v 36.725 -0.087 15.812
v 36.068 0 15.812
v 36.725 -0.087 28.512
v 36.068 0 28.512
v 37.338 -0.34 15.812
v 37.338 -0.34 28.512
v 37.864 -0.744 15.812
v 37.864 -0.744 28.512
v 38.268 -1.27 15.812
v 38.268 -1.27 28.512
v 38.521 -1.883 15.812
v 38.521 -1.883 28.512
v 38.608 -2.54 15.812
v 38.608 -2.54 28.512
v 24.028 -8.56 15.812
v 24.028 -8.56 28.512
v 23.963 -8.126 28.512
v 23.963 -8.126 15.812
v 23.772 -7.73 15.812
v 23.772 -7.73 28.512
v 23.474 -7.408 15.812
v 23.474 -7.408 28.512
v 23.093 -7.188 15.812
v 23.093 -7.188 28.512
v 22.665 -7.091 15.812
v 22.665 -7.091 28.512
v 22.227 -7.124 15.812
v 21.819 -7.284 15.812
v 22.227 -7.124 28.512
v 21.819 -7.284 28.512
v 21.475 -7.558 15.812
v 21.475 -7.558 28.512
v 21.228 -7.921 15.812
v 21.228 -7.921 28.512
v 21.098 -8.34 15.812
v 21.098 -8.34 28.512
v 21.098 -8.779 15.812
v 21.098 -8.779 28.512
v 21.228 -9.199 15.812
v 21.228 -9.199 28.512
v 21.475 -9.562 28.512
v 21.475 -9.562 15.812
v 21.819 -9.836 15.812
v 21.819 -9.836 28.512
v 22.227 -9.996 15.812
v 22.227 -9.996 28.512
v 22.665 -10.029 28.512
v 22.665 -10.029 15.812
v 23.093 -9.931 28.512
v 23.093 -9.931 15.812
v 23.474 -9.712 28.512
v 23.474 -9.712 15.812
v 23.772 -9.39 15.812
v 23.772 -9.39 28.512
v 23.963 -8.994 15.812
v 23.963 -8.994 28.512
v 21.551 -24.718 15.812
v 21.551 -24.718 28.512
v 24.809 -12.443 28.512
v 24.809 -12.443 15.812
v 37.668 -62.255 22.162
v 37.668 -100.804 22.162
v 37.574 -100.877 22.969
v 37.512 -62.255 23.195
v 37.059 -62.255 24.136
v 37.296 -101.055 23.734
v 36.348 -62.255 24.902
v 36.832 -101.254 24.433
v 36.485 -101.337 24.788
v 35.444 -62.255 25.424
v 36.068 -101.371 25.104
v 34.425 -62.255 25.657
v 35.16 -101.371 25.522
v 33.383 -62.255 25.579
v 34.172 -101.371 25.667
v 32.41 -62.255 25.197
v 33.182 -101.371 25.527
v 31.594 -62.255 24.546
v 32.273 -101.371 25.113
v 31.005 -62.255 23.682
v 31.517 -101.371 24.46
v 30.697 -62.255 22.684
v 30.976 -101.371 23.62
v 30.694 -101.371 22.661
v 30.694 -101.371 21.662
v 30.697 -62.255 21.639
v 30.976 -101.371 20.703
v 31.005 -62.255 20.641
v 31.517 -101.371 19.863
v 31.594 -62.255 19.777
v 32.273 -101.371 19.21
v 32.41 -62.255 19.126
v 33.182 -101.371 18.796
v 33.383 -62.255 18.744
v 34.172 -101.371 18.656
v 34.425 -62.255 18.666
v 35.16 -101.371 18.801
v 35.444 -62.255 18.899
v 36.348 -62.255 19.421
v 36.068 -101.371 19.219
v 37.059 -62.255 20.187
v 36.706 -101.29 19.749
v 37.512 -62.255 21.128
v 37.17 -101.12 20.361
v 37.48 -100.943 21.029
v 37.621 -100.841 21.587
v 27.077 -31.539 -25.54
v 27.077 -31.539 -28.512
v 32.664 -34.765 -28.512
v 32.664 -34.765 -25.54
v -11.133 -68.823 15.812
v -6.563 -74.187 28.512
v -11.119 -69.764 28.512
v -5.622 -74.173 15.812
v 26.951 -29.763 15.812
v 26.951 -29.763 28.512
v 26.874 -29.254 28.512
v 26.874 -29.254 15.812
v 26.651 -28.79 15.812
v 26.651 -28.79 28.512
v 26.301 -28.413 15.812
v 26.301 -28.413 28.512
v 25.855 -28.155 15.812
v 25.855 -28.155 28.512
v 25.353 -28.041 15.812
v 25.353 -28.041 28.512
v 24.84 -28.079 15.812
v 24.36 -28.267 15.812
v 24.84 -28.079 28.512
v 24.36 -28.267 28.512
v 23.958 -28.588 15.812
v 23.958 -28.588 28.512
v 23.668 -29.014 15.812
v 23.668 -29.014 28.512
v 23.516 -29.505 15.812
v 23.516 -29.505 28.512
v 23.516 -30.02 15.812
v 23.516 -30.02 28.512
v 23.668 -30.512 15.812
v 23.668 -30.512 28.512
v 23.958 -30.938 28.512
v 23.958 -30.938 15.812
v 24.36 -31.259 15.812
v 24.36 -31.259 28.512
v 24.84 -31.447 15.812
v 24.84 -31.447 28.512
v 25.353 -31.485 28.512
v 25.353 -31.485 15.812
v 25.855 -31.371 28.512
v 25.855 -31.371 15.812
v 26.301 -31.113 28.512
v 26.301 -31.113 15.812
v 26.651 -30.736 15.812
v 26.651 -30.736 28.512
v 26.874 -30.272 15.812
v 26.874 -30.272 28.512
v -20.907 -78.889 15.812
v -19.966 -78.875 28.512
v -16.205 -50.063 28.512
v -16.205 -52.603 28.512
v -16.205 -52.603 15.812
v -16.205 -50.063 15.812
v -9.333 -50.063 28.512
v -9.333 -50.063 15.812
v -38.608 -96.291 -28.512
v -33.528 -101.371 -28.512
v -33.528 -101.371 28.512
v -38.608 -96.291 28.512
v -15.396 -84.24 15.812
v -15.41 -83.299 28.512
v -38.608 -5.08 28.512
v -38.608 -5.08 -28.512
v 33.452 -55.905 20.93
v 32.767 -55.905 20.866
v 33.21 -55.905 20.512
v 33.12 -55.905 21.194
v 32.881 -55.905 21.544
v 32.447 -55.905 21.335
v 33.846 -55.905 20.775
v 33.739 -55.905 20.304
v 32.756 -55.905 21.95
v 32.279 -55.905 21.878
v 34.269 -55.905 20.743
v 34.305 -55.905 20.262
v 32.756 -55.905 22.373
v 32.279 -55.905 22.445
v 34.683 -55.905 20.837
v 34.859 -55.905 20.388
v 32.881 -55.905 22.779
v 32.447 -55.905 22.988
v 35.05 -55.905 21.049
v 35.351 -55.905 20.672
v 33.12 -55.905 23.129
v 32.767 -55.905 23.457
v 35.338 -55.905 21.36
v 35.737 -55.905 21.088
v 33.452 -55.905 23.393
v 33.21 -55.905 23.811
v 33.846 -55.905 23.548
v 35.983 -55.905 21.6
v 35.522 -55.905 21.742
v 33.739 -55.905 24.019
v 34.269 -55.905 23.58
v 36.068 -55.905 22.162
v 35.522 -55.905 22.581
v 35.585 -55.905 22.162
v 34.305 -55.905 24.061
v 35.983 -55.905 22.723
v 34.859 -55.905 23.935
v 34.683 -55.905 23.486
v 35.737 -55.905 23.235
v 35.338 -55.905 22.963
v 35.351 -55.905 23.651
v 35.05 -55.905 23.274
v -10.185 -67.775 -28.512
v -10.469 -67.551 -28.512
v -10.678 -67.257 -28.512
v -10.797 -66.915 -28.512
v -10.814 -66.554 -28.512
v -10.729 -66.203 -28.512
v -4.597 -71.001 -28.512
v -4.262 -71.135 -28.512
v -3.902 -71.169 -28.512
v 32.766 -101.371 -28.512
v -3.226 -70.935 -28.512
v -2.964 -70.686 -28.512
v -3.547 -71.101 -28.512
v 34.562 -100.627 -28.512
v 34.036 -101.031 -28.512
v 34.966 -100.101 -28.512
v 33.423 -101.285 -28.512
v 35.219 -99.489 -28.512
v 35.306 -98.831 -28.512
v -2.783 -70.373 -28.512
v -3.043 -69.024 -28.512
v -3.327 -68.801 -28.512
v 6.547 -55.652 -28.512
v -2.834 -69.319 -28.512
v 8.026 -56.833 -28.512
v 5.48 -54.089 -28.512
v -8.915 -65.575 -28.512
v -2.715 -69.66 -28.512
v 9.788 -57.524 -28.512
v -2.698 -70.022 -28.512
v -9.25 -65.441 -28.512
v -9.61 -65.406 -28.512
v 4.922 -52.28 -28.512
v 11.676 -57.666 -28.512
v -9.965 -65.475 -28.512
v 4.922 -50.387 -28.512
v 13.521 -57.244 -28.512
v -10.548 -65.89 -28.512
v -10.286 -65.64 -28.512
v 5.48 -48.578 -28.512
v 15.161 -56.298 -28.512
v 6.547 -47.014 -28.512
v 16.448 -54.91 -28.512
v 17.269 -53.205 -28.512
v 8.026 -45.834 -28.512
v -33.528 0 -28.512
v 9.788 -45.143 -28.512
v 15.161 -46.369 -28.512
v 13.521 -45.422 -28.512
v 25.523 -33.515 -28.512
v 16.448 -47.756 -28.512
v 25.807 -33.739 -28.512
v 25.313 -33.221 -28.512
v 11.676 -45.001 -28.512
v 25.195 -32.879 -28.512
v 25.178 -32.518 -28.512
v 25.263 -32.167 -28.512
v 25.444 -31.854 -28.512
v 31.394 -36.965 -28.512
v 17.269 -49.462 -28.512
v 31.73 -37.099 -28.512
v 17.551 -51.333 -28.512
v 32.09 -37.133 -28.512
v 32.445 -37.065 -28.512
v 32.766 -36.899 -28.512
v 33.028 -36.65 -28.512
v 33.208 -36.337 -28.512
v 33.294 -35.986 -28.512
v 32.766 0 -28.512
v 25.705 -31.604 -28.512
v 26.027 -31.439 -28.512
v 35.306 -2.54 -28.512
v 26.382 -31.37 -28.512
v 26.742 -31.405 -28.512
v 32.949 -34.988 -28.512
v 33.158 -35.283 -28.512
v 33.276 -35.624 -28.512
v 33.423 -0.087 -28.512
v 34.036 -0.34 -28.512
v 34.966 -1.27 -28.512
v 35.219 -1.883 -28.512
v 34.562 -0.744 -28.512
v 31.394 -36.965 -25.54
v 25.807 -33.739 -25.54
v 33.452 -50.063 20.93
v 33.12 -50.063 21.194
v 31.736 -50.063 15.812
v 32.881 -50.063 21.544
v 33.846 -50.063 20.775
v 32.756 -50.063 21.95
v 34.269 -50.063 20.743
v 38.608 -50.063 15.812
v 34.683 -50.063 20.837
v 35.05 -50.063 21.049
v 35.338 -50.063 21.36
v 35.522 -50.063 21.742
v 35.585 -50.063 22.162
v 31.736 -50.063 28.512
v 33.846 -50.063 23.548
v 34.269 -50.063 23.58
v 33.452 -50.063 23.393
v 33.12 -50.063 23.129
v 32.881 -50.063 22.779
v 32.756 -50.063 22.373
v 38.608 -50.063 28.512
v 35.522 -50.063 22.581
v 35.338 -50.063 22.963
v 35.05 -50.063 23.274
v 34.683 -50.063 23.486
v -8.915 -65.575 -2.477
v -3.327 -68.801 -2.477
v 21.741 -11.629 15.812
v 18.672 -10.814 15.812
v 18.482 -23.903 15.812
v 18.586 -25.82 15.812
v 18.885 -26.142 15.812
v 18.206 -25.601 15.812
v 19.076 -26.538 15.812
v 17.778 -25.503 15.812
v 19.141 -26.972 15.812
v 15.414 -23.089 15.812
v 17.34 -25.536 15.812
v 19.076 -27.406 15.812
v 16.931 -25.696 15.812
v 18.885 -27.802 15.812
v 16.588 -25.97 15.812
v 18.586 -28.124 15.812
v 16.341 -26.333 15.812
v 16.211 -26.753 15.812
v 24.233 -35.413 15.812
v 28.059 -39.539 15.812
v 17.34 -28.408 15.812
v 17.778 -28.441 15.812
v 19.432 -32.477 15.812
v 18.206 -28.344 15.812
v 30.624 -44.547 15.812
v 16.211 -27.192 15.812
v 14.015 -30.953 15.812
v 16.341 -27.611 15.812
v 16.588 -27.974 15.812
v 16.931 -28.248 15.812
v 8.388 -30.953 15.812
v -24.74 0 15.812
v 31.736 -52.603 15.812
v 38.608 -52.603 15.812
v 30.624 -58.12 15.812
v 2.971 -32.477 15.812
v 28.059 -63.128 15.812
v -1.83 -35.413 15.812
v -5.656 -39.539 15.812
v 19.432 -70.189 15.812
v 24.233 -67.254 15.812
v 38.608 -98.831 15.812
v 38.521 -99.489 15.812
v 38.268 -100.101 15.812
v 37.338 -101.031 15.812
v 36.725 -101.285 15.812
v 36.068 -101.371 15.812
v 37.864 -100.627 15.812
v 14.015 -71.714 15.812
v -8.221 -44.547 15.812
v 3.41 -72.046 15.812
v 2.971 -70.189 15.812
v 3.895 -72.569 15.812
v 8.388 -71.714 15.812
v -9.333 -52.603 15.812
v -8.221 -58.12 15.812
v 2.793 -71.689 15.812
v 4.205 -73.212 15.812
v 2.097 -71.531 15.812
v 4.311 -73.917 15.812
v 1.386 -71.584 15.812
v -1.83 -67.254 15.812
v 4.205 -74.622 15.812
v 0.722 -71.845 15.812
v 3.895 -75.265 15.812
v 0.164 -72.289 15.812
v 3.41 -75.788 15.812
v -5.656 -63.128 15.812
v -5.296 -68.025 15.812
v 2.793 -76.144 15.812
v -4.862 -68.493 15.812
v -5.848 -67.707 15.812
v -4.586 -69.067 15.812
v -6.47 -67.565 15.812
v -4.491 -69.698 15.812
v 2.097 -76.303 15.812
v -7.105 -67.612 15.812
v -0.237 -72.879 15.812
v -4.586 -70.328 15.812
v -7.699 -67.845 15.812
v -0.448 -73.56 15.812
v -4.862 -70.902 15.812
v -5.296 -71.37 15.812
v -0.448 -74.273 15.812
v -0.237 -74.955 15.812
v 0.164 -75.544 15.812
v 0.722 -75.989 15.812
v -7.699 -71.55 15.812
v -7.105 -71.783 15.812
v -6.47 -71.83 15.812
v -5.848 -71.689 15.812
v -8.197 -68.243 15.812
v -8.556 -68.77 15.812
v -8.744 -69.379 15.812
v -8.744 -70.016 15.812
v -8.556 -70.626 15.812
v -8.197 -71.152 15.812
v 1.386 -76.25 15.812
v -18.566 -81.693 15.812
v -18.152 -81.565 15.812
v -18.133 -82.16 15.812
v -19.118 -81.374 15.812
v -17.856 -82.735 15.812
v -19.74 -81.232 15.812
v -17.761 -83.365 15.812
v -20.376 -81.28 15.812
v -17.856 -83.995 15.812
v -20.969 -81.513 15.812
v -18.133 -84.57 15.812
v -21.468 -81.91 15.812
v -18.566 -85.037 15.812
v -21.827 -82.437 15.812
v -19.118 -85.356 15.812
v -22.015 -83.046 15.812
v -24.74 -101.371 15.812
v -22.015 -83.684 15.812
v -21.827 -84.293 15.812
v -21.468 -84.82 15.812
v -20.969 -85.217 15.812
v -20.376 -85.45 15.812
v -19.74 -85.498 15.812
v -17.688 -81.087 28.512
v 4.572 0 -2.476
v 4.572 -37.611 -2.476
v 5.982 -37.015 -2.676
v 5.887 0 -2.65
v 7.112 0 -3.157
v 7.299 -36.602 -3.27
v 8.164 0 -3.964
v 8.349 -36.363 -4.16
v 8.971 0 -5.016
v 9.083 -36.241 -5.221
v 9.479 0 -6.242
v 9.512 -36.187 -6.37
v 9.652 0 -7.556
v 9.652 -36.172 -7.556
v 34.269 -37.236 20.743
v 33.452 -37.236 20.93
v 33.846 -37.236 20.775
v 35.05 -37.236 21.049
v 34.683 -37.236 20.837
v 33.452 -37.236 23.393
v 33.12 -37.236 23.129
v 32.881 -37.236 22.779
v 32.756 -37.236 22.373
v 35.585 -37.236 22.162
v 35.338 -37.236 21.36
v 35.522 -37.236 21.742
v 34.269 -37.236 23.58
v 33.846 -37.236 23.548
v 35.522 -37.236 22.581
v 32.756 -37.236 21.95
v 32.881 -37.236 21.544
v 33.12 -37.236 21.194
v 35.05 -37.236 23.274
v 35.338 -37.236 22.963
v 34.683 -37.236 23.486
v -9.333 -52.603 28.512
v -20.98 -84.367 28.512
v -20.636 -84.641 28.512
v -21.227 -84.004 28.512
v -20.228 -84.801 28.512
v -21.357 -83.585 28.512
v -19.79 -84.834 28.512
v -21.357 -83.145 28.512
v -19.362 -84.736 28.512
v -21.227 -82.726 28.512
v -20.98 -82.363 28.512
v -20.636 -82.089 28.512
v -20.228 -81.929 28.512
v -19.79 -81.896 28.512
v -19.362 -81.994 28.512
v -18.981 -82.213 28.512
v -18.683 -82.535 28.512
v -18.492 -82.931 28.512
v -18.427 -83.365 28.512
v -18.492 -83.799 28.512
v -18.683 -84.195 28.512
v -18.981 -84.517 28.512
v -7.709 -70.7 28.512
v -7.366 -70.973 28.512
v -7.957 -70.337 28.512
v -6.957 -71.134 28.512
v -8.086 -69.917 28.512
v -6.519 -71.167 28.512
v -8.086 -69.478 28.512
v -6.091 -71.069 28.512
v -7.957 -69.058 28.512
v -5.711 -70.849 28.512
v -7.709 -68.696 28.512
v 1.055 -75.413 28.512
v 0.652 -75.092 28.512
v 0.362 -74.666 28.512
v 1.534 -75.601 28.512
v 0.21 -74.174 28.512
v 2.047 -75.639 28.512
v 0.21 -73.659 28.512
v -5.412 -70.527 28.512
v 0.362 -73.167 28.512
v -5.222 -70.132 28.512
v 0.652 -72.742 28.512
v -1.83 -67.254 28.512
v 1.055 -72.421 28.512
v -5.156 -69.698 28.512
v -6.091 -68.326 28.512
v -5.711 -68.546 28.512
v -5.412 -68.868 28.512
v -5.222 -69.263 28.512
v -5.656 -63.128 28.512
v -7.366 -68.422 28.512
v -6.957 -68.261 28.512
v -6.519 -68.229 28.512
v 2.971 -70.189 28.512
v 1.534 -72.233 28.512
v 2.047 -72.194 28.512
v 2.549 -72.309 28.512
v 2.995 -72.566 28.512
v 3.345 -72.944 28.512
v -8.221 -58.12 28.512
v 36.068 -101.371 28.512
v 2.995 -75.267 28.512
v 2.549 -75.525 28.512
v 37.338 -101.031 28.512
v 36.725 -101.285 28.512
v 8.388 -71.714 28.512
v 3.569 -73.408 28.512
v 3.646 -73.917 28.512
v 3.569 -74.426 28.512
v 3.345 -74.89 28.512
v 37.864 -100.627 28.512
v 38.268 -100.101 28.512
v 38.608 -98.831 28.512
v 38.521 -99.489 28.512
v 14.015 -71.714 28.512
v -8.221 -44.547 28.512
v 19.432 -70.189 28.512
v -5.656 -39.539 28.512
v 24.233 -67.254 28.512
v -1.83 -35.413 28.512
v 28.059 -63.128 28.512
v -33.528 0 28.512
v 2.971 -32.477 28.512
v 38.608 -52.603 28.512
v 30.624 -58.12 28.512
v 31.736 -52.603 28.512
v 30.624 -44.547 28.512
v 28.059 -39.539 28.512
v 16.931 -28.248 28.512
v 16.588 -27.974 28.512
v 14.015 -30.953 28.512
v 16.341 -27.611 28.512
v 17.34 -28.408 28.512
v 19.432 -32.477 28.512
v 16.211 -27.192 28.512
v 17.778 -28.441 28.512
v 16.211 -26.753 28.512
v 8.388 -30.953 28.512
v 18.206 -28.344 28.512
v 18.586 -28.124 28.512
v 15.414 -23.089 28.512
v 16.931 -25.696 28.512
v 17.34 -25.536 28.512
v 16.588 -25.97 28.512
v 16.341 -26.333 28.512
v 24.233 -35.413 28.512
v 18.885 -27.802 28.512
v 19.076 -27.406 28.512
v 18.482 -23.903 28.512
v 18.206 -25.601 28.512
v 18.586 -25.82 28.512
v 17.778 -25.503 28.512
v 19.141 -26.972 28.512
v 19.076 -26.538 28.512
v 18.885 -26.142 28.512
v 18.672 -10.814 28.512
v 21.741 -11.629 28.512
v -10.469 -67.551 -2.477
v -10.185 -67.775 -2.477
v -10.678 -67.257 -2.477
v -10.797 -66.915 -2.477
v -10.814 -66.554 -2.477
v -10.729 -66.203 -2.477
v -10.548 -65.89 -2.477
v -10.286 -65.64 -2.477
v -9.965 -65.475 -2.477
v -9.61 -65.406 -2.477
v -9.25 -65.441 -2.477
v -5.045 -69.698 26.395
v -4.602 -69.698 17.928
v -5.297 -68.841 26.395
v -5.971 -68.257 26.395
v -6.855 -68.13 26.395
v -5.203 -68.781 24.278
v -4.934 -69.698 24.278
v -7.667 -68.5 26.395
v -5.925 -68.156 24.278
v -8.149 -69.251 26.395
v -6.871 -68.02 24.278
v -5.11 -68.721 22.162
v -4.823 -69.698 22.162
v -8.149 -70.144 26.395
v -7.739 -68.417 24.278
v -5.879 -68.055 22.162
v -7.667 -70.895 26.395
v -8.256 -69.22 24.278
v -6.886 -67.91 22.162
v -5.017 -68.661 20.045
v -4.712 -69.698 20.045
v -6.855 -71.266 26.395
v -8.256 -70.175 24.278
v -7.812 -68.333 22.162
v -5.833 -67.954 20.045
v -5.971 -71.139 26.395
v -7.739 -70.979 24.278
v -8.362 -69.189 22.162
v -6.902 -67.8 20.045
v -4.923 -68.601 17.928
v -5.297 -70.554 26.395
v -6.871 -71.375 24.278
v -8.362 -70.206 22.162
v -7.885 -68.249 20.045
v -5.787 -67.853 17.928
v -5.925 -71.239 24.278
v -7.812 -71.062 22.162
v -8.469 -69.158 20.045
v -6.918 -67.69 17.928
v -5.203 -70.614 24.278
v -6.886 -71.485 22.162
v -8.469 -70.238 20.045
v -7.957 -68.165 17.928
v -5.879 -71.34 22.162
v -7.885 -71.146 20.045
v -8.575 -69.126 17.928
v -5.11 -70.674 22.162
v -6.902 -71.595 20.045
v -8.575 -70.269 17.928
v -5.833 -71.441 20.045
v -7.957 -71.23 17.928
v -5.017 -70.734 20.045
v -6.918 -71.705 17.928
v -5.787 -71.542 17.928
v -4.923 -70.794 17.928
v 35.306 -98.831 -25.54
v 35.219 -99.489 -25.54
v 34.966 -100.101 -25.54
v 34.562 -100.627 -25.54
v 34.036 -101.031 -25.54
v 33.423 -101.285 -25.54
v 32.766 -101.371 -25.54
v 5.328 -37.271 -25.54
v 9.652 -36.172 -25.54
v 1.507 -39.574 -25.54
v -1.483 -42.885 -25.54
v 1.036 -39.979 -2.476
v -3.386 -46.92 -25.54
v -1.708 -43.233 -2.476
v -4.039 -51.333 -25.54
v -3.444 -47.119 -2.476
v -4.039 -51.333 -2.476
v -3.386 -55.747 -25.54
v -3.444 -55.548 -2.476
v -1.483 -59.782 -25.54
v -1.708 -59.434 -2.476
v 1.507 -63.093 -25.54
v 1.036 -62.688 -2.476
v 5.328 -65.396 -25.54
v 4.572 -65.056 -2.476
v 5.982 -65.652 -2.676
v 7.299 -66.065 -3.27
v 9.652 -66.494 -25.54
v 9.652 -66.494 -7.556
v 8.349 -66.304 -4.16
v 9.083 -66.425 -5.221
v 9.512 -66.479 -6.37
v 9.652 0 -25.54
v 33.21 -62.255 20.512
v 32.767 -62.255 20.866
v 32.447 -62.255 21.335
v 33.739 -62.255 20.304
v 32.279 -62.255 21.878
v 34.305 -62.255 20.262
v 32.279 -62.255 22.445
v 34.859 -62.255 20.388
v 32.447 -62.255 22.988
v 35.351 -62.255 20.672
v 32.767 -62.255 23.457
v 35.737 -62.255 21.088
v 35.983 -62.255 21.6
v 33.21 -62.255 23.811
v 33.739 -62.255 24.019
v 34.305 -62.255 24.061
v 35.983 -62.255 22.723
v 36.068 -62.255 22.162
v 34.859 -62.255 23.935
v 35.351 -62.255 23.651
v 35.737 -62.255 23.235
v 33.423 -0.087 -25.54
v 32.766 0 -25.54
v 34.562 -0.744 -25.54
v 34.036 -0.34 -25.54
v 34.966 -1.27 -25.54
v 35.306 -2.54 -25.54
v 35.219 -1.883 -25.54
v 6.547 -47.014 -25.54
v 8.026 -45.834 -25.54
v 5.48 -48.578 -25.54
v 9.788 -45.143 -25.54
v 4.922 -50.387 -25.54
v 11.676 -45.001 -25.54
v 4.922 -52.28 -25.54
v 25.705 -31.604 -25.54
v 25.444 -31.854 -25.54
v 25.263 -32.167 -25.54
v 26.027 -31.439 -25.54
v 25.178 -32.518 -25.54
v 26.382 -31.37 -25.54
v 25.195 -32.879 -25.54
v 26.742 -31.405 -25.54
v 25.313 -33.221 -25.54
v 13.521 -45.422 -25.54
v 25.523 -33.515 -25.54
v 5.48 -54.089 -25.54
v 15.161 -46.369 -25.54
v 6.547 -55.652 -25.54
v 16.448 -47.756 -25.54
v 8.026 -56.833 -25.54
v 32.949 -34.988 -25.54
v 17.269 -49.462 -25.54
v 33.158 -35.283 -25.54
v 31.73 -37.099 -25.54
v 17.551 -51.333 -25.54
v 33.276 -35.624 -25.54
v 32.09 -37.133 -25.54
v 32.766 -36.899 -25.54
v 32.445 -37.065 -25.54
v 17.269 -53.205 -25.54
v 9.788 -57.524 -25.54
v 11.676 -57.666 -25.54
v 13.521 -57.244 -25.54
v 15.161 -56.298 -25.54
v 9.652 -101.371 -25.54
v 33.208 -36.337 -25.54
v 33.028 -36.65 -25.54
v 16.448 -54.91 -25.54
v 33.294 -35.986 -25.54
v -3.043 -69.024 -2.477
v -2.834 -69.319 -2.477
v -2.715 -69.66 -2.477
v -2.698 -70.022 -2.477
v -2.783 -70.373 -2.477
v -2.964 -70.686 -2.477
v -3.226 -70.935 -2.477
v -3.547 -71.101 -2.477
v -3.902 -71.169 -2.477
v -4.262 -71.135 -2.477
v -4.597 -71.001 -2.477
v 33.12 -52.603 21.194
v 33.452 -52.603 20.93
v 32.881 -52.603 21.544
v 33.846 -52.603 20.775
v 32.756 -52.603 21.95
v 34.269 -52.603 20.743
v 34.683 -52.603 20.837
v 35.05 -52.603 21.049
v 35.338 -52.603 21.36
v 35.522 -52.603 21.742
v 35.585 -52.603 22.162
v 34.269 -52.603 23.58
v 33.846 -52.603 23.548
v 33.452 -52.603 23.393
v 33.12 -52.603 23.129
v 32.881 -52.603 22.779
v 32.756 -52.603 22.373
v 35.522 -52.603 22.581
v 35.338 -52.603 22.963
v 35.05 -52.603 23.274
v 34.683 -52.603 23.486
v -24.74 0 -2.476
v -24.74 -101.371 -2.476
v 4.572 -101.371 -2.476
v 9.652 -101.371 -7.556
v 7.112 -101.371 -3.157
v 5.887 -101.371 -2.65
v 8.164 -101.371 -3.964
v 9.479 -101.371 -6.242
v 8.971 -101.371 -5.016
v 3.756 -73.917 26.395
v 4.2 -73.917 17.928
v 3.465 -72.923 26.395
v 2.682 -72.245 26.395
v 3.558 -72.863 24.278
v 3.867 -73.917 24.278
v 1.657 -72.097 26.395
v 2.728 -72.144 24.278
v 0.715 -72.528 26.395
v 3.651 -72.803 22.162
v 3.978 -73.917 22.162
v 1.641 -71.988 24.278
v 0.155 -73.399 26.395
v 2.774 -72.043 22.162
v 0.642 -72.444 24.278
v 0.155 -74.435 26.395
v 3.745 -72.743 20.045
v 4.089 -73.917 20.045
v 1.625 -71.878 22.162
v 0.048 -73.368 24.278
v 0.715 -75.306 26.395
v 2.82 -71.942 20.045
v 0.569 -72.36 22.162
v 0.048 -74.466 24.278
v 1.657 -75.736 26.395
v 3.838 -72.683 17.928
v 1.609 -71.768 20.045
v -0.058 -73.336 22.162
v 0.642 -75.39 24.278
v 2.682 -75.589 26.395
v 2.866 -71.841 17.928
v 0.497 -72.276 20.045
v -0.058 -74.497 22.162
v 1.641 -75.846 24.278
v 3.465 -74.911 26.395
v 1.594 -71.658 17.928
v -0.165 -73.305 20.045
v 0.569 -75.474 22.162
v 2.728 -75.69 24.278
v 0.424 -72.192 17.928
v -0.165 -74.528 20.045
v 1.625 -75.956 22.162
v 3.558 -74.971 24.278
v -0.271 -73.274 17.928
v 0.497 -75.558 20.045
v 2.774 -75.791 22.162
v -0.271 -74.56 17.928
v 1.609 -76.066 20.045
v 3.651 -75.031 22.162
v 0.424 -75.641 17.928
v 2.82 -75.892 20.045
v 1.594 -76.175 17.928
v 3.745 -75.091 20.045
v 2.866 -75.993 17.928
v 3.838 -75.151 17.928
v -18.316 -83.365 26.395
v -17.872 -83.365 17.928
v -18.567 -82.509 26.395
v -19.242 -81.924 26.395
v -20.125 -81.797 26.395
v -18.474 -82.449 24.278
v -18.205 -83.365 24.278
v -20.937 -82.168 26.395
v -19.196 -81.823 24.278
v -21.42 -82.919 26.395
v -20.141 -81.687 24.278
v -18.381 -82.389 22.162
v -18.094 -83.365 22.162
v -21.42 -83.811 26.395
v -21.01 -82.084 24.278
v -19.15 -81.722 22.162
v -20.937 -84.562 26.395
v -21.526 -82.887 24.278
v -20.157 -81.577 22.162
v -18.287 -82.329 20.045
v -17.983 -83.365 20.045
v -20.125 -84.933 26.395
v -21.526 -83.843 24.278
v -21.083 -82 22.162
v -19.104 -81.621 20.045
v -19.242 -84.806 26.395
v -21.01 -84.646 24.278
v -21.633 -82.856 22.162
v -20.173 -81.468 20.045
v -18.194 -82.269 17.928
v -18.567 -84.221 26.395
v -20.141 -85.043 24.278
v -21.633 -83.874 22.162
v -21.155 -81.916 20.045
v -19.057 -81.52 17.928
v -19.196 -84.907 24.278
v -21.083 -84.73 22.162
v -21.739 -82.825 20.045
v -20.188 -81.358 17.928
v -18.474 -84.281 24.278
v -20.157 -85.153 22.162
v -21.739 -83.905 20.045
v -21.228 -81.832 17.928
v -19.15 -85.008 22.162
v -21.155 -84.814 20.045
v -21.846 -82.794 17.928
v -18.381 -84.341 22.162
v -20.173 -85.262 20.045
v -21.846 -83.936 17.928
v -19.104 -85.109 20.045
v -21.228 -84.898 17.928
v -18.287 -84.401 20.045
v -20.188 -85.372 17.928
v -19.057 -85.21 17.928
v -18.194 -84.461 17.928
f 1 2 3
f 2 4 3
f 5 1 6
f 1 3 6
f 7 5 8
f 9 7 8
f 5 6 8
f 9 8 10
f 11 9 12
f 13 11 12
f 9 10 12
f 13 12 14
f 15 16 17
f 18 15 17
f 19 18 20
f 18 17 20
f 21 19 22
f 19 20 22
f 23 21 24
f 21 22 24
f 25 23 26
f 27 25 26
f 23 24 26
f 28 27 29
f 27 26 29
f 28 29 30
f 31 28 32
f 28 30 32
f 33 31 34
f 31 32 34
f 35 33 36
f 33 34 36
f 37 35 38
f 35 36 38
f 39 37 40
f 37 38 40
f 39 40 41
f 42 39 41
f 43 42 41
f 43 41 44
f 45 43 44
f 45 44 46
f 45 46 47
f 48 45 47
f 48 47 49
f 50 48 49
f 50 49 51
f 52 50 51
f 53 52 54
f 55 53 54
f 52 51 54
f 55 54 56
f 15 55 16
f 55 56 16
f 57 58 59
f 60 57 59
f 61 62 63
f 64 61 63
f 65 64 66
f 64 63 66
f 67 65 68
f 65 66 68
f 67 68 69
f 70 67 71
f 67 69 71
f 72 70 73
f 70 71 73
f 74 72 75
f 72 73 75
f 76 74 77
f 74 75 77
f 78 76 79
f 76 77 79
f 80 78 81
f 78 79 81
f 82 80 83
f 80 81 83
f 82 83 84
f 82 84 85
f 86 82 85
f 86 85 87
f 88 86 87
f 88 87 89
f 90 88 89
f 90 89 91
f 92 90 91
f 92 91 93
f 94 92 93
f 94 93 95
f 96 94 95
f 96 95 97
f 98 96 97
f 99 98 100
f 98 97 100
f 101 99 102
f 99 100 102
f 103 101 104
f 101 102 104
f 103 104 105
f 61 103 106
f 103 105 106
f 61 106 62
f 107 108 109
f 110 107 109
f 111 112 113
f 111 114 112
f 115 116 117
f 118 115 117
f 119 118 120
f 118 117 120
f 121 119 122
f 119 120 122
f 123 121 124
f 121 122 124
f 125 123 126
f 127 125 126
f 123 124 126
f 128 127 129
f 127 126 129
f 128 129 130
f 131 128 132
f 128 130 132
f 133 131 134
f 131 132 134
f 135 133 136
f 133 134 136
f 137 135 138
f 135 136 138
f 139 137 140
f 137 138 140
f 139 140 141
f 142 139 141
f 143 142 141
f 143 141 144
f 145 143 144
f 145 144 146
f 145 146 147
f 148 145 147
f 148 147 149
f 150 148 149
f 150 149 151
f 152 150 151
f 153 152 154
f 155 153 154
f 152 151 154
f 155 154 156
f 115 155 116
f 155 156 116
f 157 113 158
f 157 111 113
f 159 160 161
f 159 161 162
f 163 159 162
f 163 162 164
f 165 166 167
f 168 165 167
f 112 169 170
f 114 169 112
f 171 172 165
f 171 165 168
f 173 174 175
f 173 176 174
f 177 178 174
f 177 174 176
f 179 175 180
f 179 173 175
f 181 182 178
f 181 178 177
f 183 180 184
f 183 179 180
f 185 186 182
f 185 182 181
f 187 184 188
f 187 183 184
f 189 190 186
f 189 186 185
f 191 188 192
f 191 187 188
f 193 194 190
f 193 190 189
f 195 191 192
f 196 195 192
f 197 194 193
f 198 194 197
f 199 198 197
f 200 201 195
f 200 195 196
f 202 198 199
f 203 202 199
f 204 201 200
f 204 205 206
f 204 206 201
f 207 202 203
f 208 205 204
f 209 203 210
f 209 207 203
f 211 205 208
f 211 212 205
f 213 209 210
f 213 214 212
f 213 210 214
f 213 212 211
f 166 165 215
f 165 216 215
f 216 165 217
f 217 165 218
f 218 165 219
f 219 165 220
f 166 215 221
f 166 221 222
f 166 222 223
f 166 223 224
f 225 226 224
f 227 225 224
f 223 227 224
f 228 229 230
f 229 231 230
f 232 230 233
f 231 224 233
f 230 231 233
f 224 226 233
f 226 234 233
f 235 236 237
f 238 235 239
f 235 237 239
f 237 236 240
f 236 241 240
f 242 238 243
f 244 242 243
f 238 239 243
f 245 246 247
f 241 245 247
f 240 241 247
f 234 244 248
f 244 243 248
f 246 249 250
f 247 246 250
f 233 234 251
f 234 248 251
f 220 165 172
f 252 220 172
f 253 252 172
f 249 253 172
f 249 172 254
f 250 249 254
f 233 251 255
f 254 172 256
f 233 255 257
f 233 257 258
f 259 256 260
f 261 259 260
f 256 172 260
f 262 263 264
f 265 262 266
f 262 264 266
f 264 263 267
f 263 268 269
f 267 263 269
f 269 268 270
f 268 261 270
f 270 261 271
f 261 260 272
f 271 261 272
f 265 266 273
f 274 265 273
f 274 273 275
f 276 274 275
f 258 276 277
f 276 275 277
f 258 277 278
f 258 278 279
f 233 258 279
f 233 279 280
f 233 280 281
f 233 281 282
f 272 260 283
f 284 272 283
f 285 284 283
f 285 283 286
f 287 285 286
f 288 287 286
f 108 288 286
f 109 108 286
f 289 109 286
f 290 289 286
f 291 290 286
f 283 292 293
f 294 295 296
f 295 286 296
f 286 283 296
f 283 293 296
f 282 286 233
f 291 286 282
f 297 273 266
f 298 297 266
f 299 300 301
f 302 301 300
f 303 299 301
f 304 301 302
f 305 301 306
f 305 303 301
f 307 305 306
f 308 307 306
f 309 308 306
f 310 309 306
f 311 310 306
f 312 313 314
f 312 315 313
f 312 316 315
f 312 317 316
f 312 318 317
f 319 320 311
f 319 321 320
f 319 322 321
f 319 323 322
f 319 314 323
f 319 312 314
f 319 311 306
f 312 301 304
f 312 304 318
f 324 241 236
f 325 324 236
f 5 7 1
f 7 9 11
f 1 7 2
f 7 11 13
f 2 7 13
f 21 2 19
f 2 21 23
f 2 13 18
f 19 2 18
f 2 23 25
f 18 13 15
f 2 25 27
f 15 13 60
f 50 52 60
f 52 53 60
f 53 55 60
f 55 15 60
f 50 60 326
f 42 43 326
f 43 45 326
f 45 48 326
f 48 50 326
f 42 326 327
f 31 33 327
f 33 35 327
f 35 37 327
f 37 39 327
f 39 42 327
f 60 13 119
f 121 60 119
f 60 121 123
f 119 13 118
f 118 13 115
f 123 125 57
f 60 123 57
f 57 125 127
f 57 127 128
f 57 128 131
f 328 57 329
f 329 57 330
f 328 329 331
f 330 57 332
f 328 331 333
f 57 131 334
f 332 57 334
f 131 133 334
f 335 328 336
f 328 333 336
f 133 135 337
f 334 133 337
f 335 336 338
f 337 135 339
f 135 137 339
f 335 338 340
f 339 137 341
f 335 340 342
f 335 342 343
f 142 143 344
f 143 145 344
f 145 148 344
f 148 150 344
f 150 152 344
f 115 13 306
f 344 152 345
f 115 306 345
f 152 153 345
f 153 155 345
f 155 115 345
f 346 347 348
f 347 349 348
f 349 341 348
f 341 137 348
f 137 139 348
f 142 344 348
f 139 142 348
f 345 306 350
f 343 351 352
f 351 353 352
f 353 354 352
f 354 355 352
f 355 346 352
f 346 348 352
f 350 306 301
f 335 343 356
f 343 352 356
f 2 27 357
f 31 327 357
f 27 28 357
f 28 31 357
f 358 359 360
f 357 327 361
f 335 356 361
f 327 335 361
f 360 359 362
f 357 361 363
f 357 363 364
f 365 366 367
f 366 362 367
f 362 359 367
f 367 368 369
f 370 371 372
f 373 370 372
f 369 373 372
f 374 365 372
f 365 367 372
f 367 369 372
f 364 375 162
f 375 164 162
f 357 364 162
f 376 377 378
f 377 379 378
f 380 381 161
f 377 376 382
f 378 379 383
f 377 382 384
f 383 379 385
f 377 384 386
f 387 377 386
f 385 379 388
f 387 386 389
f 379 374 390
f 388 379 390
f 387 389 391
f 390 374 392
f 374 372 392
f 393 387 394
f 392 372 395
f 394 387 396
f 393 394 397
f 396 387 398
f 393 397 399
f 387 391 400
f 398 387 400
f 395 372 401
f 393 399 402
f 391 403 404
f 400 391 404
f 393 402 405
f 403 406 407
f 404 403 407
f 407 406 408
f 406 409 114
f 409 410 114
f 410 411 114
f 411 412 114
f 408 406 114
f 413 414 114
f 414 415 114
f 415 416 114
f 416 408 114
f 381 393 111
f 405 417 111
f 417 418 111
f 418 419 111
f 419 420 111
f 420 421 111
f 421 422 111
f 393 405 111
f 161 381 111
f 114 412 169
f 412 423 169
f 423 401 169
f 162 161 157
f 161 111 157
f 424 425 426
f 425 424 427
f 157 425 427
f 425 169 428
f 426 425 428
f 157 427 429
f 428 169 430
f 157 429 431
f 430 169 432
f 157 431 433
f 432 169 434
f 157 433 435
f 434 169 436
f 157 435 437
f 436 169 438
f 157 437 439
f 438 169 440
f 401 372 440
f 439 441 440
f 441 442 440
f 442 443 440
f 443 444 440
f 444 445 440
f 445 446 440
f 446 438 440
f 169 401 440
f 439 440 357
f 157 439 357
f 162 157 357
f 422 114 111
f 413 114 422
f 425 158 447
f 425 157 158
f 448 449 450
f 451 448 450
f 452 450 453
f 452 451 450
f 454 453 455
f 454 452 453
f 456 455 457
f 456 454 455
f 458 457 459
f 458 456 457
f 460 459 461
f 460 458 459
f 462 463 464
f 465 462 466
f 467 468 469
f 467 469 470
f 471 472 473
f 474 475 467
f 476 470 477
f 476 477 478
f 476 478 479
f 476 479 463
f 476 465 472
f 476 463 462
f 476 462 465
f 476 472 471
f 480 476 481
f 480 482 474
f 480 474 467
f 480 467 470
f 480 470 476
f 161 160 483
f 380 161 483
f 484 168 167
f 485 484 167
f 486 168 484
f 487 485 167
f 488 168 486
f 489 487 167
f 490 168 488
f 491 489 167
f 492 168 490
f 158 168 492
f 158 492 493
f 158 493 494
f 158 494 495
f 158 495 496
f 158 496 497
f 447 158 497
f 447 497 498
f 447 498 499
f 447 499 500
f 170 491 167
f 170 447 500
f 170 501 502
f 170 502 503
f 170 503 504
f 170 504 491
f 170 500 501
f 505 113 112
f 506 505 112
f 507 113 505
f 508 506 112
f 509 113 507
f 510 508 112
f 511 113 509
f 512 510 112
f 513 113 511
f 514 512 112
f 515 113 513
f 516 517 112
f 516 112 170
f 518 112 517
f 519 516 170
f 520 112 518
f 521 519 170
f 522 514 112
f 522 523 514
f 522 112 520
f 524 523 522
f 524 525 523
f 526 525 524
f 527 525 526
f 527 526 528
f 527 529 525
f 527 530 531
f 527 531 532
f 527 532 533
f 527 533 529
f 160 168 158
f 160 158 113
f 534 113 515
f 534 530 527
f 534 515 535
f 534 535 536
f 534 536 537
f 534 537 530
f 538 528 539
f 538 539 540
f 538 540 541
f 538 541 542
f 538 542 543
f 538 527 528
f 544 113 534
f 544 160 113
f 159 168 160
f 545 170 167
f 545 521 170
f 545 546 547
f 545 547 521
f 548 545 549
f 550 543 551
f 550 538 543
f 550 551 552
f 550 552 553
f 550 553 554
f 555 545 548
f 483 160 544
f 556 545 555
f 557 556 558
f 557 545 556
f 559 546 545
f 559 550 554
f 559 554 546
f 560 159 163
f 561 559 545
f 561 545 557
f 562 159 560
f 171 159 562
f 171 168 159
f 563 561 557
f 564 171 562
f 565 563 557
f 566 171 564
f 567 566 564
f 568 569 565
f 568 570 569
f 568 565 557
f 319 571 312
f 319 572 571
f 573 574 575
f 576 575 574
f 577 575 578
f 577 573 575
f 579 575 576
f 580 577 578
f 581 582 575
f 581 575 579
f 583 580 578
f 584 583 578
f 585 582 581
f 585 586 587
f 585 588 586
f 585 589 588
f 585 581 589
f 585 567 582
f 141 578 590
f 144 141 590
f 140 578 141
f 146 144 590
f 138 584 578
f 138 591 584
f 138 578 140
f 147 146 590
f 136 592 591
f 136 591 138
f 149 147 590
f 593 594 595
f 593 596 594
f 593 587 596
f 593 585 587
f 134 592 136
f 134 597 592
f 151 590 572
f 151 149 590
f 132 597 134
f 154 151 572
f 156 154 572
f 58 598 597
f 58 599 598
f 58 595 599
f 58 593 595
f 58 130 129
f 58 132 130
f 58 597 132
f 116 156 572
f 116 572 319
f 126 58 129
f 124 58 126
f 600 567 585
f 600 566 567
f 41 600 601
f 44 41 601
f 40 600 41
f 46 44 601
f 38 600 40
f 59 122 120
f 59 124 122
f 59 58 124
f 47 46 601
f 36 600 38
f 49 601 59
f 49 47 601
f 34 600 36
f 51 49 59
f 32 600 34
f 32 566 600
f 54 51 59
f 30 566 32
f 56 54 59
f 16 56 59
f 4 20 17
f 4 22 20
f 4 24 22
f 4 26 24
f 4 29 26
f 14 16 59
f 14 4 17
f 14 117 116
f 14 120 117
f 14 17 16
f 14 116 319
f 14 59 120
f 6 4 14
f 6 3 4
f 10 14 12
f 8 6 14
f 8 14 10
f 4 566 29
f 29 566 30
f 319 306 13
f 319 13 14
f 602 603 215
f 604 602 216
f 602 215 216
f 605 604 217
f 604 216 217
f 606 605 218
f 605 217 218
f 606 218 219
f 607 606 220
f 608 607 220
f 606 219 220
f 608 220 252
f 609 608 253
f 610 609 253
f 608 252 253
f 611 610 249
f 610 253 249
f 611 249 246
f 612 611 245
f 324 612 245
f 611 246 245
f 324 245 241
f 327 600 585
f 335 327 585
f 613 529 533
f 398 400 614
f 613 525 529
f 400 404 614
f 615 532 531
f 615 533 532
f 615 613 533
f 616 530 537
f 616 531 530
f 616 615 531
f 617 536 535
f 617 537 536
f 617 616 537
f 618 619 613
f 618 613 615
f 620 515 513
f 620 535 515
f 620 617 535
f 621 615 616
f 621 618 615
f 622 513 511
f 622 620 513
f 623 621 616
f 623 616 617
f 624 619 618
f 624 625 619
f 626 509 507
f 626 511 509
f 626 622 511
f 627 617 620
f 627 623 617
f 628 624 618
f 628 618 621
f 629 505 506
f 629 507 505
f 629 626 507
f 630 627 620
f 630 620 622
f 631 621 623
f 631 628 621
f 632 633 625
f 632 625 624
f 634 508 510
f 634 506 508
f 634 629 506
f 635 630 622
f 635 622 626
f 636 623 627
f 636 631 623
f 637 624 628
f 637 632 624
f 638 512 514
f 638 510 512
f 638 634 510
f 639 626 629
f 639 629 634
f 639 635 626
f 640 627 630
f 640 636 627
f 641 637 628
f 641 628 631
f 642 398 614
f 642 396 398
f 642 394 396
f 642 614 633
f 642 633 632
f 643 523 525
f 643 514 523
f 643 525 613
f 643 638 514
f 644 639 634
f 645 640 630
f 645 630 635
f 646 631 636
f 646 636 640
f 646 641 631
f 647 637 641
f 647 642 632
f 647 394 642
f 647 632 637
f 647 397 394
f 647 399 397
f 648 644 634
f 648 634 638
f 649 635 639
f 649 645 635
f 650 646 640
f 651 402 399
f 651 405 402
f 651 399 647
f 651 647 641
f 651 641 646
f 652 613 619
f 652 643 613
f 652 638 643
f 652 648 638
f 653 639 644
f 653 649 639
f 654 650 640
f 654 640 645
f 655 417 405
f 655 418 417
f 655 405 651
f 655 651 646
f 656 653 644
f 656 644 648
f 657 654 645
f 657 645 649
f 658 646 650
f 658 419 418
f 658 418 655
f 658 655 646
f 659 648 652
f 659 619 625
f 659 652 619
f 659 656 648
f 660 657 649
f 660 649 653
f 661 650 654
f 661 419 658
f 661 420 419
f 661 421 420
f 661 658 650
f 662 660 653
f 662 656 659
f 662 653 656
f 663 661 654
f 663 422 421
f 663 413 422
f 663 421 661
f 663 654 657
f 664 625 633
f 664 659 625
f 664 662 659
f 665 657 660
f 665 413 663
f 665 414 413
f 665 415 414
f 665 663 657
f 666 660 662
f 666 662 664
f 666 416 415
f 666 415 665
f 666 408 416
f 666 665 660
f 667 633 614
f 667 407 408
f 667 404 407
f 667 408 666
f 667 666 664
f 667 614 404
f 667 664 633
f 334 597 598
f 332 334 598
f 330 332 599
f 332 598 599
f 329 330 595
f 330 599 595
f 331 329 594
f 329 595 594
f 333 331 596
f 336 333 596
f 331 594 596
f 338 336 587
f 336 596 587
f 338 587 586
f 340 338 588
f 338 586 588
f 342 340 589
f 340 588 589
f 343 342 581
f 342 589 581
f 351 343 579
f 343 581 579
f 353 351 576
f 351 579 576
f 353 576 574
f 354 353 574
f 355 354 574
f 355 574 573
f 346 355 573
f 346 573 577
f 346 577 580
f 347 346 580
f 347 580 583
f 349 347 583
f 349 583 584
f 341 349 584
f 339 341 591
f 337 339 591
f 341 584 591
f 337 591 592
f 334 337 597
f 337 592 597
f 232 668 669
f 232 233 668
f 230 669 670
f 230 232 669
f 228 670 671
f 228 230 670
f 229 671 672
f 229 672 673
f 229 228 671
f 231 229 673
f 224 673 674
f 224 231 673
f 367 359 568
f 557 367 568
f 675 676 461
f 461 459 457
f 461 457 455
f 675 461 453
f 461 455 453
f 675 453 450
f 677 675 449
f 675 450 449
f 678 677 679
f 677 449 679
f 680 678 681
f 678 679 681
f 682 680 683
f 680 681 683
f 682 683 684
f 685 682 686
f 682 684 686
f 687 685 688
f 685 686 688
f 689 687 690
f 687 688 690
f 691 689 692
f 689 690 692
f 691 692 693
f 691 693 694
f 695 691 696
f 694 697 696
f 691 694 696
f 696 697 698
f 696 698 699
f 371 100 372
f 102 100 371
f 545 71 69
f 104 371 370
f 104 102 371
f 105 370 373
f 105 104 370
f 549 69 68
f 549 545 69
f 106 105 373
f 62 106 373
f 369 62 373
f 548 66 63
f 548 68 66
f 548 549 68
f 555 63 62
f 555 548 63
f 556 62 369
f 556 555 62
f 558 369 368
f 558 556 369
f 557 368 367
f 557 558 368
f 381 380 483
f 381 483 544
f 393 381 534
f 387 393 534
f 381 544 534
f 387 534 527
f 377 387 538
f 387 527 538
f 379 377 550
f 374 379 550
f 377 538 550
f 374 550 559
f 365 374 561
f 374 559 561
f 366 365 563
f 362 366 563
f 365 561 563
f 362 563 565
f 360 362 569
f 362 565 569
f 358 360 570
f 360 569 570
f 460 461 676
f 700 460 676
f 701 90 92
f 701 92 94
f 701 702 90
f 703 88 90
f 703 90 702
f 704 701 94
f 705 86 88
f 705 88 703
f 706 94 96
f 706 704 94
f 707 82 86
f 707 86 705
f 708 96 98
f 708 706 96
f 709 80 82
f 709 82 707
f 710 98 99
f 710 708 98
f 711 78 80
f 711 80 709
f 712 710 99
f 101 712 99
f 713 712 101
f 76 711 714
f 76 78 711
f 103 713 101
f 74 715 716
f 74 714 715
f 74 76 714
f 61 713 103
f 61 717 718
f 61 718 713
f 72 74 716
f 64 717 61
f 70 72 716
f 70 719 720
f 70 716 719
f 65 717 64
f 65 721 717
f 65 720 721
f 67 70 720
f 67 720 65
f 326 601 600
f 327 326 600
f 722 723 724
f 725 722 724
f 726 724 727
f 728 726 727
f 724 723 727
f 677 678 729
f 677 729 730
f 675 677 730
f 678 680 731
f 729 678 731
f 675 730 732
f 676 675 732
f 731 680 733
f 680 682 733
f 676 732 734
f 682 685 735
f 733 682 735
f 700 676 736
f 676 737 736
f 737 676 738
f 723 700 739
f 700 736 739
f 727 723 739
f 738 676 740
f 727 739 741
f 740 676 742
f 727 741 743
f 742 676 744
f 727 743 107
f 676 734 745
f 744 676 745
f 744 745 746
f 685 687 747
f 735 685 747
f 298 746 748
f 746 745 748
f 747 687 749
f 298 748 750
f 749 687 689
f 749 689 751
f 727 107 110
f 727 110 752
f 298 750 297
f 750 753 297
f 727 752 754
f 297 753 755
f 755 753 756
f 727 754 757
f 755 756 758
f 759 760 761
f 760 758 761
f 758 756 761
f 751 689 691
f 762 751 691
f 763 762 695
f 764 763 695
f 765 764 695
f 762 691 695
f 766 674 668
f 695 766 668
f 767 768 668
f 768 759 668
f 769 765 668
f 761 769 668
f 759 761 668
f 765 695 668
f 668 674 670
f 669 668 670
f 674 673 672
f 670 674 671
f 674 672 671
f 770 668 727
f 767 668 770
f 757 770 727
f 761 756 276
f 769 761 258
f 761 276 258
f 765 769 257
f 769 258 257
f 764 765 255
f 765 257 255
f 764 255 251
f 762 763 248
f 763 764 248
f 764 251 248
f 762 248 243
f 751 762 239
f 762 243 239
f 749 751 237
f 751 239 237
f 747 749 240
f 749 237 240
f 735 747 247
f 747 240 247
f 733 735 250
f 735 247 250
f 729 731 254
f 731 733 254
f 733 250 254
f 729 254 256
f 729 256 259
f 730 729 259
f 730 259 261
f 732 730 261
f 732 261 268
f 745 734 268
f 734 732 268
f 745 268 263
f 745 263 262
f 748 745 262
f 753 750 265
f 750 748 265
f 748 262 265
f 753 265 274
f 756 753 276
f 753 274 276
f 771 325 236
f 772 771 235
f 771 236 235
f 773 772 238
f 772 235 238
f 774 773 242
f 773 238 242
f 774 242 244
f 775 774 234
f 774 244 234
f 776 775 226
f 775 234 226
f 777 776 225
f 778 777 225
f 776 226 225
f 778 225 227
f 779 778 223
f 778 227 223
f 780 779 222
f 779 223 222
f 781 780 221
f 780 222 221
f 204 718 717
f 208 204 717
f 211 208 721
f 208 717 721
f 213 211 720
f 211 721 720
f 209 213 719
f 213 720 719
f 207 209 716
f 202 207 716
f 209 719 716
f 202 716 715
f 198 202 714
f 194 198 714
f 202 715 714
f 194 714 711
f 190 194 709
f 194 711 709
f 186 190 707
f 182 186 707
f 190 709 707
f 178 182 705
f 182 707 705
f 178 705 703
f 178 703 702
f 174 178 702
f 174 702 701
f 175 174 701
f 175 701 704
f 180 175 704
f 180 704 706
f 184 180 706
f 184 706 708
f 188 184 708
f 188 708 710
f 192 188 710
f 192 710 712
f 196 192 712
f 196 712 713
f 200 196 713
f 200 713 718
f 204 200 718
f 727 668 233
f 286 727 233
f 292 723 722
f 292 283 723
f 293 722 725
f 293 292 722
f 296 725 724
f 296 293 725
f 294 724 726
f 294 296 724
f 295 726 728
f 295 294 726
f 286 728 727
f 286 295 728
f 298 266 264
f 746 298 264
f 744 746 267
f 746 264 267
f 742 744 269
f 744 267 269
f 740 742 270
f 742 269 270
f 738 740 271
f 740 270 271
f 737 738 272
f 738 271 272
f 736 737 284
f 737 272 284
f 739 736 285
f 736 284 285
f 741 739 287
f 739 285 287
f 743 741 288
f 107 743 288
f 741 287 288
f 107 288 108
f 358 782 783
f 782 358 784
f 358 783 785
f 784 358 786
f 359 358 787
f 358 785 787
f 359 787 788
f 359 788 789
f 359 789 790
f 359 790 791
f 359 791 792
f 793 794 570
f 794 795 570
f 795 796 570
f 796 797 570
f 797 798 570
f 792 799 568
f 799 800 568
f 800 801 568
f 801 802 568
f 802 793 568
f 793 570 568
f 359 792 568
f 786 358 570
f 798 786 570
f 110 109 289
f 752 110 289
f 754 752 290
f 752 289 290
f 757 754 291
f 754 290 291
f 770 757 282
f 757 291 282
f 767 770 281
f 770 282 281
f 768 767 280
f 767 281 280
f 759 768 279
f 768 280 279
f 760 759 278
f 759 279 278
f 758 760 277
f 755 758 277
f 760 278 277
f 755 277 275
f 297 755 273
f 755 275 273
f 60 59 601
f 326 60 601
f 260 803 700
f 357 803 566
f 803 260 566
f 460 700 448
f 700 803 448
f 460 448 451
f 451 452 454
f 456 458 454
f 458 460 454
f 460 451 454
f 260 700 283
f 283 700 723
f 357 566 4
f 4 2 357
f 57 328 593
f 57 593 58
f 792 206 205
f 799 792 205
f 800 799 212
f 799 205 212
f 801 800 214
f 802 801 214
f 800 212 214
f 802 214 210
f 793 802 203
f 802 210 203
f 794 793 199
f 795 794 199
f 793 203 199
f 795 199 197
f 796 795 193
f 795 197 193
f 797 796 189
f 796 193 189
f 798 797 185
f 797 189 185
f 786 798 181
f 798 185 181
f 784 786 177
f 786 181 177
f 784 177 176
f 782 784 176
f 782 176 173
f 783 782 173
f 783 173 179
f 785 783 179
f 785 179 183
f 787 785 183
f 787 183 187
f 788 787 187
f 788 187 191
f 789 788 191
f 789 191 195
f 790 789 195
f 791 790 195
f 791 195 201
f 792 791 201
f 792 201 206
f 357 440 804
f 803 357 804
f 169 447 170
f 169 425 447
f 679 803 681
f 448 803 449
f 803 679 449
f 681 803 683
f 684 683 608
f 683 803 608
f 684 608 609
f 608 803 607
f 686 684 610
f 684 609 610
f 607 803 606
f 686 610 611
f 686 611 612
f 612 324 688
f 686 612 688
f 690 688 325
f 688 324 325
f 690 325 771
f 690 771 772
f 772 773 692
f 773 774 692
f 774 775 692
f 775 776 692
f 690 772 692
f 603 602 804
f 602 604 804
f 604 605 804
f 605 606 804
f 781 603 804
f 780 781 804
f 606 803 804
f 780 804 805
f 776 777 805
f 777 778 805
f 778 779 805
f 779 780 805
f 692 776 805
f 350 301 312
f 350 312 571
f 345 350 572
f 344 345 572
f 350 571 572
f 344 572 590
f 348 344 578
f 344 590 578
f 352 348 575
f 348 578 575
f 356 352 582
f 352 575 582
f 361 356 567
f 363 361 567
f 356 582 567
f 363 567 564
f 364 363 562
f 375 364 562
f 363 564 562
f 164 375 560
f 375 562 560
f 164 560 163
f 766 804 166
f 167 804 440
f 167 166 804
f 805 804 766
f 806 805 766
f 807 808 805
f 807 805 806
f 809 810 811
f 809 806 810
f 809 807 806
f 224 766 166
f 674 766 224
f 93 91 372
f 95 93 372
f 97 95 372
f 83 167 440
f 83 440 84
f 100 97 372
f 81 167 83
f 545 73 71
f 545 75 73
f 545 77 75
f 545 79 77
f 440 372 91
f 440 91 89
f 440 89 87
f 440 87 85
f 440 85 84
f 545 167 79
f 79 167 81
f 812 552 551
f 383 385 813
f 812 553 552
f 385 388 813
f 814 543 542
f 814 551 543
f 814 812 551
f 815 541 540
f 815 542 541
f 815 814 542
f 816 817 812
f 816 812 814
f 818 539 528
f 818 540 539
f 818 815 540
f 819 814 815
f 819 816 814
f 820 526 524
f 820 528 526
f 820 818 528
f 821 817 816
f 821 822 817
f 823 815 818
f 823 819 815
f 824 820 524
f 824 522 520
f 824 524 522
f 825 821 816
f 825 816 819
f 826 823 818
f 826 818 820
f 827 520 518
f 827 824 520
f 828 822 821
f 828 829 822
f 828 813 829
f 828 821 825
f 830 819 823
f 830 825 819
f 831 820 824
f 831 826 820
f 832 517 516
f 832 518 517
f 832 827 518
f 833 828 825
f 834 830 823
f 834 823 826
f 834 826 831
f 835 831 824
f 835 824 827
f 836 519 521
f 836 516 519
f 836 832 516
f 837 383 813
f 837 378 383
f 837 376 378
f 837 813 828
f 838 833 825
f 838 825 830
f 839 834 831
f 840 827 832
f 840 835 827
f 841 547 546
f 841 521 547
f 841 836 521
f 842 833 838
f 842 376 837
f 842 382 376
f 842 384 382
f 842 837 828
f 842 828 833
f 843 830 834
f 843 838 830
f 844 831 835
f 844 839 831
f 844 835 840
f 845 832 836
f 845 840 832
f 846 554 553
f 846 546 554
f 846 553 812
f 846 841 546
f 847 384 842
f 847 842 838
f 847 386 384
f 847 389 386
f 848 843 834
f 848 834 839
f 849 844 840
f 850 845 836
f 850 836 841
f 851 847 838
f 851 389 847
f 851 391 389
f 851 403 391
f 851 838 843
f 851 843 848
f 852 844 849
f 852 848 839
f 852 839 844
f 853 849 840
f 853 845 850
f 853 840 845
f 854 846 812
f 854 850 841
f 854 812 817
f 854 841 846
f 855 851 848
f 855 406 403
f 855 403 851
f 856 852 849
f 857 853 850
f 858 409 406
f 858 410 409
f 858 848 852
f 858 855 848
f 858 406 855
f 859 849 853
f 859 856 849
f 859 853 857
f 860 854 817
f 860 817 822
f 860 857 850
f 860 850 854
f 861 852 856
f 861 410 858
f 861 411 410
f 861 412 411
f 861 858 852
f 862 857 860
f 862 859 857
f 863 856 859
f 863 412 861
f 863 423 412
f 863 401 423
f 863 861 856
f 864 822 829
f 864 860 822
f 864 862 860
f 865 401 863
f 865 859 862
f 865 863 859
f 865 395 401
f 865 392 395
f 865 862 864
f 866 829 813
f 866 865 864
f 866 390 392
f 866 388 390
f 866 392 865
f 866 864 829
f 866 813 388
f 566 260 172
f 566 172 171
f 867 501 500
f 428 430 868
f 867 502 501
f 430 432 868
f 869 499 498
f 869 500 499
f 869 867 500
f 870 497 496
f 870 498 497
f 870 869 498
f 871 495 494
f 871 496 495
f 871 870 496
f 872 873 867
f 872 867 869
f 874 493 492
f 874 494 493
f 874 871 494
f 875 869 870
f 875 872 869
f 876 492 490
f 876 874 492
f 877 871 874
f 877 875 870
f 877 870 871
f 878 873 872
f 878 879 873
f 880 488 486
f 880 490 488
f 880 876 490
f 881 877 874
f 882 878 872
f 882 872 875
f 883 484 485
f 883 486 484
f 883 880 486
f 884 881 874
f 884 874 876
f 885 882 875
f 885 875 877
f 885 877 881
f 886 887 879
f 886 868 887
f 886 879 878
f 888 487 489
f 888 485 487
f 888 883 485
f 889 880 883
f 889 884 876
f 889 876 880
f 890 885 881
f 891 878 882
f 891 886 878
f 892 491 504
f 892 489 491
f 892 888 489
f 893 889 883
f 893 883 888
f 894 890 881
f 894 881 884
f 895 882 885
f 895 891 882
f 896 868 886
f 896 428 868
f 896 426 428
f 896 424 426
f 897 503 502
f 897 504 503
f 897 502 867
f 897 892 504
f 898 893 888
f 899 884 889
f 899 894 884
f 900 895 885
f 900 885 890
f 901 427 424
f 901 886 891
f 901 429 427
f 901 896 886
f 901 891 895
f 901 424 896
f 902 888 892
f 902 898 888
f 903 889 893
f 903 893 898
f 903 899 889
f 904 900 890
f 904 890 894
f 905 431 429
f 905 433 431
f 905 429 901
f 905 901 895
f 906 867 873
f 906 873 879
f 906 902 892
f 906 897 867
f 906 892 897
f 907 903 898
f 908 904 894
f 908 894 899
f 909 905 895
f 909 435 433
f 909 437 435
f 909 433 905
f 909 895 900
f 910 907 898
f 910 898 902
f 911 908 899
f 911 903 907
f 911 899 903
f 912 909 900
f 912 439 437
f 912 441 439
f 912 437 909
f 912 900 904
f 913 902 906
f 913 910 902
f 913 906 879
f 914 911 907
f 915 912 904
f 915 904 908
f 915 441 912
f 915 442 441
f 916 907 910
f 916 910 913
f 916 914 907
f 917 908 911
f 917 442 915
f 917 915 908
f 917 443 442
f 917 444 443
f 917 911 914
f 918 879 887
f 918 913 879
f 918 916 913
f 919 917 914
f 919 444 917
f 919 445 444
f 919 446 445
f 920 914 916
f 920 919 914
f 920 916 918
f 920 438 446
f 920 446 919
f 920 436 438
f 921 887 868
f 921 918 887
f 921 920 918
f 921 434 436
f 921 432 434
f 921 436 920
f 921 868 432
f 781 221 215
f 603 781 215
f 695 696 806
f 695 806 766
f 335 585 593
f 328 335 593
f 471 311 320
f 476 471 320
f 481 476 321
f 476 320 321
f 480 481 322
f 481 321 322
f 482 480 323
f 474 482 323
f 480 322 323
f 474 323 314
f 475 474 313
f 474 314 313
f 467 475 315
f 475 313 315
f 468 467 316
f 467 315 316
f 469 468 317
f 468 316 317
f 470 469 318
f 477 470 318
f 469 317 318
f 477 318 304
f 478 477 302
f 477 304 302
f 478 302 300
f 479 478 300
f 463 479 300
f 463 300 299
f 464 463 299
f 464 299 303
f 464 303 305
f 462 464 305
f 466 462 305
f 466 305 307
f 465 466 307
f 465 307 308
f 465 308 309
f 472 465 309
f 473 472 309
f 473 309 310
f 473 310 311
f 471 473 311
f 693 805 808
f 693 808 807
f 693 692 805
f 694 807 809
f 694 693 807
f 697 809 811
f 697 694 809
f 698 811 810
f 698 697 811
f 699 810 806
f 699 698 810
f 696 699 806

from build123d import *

# Parameters (mm, degrees)
F0_W      = 77.216
F0_H      = 57.023
F1_DEPTH  = 101.3714
F4_DEPTH  = 101.3724
F6_R      = 6.35
F7_DEPTH  = 57.024
F8_R      = 15.24
F9_DEPTH  = 23.0632
F10_R     = 20.574
F11_DEPTH = 12.7
F12_W     = 54.8132
F12_H     = 2.54
F13_DEPTH = 12.7
F14_SIZE  = 5.08
F15_R     = 5.08
F16_R     = 2.54
F18_DEPTH = 26.036
F19_R     = 1.4224
F20_DEPTH = 64.135
F19_R_2   = 1.905
F21_DEPTH = 45.466
F19_R_3   = 3.5052
F22_DEPTH = 39.116
F23_R     = 1.4732
F23_R_2   = 1.7272
F24_DEPTH = 12.7
F25_R     = 1.4732
F25_R_2   = 1.7272
F26_DEPTH = 12.7
F26_TAPER = -3


with BuildPart() as f1:
    # F0 (on Front) → F1 (new body)
    with BuildSketch(Plane.XZ):
        Rectangle(F0_W, F0_H)
    extrude(amount=F1_DEPTH)

    # F3 (on face) → F4 (cut, through all)
    with BuildSketch(Plane.XZ.offset(101.3714)):
        Polygon((35.306, -28.5115), (38.608, -28.5115), (38.608, 15.8115), (-24.7396, 15.8115), (-24.7396, -2.4765), (9.652, -2.4765), (9.652, -25.5397), (35.306, -25.5397), align=None)
    extrude(amount=-F4_DEPTH, mode=Mode.SUBTRACT)

    # F6 (on face) → F7 (cut, through all)
    with BuildSketch(Plane(origin=(0, 0, -28.5115), x_dir=(1, 0, 0), z_dir=(0, 0, -1))):
        with Locations((11.2014, 51.3334)):
            Circle(F6_R)
    extrude(amount=-F7_DEPTH, mode=Mode.SUBTRACT)

    # F8 (on face) → F9 (cut, through all)
    with BuildSketch(Plane.XY.offset(-2.4765)):
        with Locations((11.2014, -51.3334)):
            Circle(F8_R)
    extrude(amount=-F9_DEPTH, mode=Mode.SUBTRACT)

    # F10 (on face) → F11 (cut, through all)
    with BuildSketch(Plane.XY.offset(28.5115)):
        with Locations((11.2014, -51.3334)):
            Circle(F10_R)
    extrude(amount=-F11_DEPTH, mode=Mode.SUBTRACT)

    # F12 (on face) → F13 (cut, through all)
    with BuildSketch(Plane.XY.offset(28.5115)):
        with Locations((11.2014, -51.3334)):
            Rectangle(F12_W, F12_H)
    extrude(amount=-F13_DEPTH, mode=Mode.SUBTRACT)

    # F14
    f14_edges = [f1.edges().sort_by_distance(p)[0] for p in [
        (-38.608, 0, 0),
        (-38.608, -101.3714, 0),
    ]]
    chamfer(f14_edges, length=F14_SIZE)

    # F15
    f15_edges = [f1.edges().sort_by_distance(p)[0] for p in [
        (9.652, -83.932917, -2.4765),
        (9.652, -18.086183, -2.4765),
    ]]
    fillet(f15_edges, radius=F15_R)

    # F16
    f16_edges = [f1.edges().sort_by_distance(p)[0] for p in [
        (38.608, -101.3714, 22.1615),
        (38.608, 0, 22.1615),
        (35.306, -101.3714, -27.0256),
        (35.306, 0, -27.0256),
    ]]
    fillet(f16_edges, radius=F16_R)

    # F17 (on face) → F18 (cut, through all)
    with BuildSketch(Plane(origin=(0, 0, -28.5115), x_dir=(1, 0, 0), z_dir=(0, 0, -1))):
        with BuildLine():
            Line((27.0771505049, 31.5391477372), (32.6644, 34.7649477372))
            ThreePointArc((32.6644, 34.7649477372), (33.1292522628, 36.4998), (31.3944, 36.9646522628))
            Line((31.3944, 36.9646522628), (25.8071505049, 33.7388522628))
            ThreePointArc((25.8071505049, 33.7388522628), (25.3422982421, 32.004), (27.0771505049, 31.5391477372))
        make_face()
        with BuildLine():
            Line((-8.9146494951, 65.5751477372), (-3.3274, 68.8009477372))
            ThreePointArc((-3.3274, 68.8009477372), (-2.8625477372, 70.5358), (-4.5974, 71.0006522628))
            Line((-4.5974, 71.0006522628), (-10.1846494951, 67.7748522628))
            ThreePointArc((-10.1846494951, 67.7748522628), (-10.6495017579, 66.04), (-8.9146494951, 65.5751477372))
        make_face()
    extrude(amount=-F18_DEPTH, mode=Mode.SUBTRACT)

    # F19 (on face) → F20 (cut)
    with BuildSketch(Plane.XZ.offset(101.3714)):
        with Locations((34.163, 22.1615)):
            Circle(F19_R)
    extrude(amount=-F20_DEPTH, mode=Mode.SUBTRACT)

    # F19 (on face) → F21 (cut)
    with BuildSketch(Plane.XZ.offset(101.3714)):
        with Locations((34.163, 22.1615)):
            Circle(F19_R_2)
        with Locations((34.163, 22.1615)):
            Circle(F19_R, mode=Mode.SUBTRACT)
    extrude(amount=-F21_DEPTH, mode=Mode.SUBTRACT)

    # F19 (on face) → F22 (cut)
    with BuildSketch(Plane.XZ.offset(101.3714)):
        with Locations((34.163, 22.1615)):
            Circle(F19_R_3)
        with Locations((34.163, 22.1615)):
            Circle(F19_R_2, mode=Mode.SUBTRACT)
    extrude(amount=-F22_DEPTH, mode=Mode.SUBTRACT)

    # F23 (on face) → F24 (cut, through all)
    with BuildSketch(Plane.XY.offset(28.5115)):
        with Locations((22.5552, -8.5598)):
            Circle(F23_R)
        with Locations((17.6678259177, -26.97218916)):
            Circle(F23_R)
        Polygon((24.8093691796, -12.4430938737), (21.740637653, -11.6285315267), (18.6719061263, -10.8139691796), (15.4136567381, -23.0888952863), (18.4823882648, -23.9034576334), (21.5511197915, -24.7180199804), align=None)
        with Locations((25.2238661051, -29.762910679)):
            Circle(F23_R_2)
    extrude(amount=-F24_DEPTH, mode=Mode.SUBTRACT)

    # F25 (on face) → F26 (cut, through all)
    with BuildSketch(Plane.XY.offset(28.5115)):
        with Locations((-6.6294, -69.6976)):
            Circle(F25_R)
        with Locations((-19.8998323352, -83.3650110803)):
            Circle(F25_R)
        Polygon((-6.5632368758, -74.1872405692), (-8.8411387225, -71.9755018467), (-11.1190405692, -69.7637631242), (-19.9659954594, -78.875370511), (-17.6880936127, -81.0871092336), (-15.410191766, -83.2988479561), align=None)
        with Locations((1.9183511613, -73.9168599248)):
            Circle(F25_R_2)
    extrude(amount=-F26_DEPTH, taper=F26_TAPER, mode=Mode.SUBTRACT)


solid = f1.part
